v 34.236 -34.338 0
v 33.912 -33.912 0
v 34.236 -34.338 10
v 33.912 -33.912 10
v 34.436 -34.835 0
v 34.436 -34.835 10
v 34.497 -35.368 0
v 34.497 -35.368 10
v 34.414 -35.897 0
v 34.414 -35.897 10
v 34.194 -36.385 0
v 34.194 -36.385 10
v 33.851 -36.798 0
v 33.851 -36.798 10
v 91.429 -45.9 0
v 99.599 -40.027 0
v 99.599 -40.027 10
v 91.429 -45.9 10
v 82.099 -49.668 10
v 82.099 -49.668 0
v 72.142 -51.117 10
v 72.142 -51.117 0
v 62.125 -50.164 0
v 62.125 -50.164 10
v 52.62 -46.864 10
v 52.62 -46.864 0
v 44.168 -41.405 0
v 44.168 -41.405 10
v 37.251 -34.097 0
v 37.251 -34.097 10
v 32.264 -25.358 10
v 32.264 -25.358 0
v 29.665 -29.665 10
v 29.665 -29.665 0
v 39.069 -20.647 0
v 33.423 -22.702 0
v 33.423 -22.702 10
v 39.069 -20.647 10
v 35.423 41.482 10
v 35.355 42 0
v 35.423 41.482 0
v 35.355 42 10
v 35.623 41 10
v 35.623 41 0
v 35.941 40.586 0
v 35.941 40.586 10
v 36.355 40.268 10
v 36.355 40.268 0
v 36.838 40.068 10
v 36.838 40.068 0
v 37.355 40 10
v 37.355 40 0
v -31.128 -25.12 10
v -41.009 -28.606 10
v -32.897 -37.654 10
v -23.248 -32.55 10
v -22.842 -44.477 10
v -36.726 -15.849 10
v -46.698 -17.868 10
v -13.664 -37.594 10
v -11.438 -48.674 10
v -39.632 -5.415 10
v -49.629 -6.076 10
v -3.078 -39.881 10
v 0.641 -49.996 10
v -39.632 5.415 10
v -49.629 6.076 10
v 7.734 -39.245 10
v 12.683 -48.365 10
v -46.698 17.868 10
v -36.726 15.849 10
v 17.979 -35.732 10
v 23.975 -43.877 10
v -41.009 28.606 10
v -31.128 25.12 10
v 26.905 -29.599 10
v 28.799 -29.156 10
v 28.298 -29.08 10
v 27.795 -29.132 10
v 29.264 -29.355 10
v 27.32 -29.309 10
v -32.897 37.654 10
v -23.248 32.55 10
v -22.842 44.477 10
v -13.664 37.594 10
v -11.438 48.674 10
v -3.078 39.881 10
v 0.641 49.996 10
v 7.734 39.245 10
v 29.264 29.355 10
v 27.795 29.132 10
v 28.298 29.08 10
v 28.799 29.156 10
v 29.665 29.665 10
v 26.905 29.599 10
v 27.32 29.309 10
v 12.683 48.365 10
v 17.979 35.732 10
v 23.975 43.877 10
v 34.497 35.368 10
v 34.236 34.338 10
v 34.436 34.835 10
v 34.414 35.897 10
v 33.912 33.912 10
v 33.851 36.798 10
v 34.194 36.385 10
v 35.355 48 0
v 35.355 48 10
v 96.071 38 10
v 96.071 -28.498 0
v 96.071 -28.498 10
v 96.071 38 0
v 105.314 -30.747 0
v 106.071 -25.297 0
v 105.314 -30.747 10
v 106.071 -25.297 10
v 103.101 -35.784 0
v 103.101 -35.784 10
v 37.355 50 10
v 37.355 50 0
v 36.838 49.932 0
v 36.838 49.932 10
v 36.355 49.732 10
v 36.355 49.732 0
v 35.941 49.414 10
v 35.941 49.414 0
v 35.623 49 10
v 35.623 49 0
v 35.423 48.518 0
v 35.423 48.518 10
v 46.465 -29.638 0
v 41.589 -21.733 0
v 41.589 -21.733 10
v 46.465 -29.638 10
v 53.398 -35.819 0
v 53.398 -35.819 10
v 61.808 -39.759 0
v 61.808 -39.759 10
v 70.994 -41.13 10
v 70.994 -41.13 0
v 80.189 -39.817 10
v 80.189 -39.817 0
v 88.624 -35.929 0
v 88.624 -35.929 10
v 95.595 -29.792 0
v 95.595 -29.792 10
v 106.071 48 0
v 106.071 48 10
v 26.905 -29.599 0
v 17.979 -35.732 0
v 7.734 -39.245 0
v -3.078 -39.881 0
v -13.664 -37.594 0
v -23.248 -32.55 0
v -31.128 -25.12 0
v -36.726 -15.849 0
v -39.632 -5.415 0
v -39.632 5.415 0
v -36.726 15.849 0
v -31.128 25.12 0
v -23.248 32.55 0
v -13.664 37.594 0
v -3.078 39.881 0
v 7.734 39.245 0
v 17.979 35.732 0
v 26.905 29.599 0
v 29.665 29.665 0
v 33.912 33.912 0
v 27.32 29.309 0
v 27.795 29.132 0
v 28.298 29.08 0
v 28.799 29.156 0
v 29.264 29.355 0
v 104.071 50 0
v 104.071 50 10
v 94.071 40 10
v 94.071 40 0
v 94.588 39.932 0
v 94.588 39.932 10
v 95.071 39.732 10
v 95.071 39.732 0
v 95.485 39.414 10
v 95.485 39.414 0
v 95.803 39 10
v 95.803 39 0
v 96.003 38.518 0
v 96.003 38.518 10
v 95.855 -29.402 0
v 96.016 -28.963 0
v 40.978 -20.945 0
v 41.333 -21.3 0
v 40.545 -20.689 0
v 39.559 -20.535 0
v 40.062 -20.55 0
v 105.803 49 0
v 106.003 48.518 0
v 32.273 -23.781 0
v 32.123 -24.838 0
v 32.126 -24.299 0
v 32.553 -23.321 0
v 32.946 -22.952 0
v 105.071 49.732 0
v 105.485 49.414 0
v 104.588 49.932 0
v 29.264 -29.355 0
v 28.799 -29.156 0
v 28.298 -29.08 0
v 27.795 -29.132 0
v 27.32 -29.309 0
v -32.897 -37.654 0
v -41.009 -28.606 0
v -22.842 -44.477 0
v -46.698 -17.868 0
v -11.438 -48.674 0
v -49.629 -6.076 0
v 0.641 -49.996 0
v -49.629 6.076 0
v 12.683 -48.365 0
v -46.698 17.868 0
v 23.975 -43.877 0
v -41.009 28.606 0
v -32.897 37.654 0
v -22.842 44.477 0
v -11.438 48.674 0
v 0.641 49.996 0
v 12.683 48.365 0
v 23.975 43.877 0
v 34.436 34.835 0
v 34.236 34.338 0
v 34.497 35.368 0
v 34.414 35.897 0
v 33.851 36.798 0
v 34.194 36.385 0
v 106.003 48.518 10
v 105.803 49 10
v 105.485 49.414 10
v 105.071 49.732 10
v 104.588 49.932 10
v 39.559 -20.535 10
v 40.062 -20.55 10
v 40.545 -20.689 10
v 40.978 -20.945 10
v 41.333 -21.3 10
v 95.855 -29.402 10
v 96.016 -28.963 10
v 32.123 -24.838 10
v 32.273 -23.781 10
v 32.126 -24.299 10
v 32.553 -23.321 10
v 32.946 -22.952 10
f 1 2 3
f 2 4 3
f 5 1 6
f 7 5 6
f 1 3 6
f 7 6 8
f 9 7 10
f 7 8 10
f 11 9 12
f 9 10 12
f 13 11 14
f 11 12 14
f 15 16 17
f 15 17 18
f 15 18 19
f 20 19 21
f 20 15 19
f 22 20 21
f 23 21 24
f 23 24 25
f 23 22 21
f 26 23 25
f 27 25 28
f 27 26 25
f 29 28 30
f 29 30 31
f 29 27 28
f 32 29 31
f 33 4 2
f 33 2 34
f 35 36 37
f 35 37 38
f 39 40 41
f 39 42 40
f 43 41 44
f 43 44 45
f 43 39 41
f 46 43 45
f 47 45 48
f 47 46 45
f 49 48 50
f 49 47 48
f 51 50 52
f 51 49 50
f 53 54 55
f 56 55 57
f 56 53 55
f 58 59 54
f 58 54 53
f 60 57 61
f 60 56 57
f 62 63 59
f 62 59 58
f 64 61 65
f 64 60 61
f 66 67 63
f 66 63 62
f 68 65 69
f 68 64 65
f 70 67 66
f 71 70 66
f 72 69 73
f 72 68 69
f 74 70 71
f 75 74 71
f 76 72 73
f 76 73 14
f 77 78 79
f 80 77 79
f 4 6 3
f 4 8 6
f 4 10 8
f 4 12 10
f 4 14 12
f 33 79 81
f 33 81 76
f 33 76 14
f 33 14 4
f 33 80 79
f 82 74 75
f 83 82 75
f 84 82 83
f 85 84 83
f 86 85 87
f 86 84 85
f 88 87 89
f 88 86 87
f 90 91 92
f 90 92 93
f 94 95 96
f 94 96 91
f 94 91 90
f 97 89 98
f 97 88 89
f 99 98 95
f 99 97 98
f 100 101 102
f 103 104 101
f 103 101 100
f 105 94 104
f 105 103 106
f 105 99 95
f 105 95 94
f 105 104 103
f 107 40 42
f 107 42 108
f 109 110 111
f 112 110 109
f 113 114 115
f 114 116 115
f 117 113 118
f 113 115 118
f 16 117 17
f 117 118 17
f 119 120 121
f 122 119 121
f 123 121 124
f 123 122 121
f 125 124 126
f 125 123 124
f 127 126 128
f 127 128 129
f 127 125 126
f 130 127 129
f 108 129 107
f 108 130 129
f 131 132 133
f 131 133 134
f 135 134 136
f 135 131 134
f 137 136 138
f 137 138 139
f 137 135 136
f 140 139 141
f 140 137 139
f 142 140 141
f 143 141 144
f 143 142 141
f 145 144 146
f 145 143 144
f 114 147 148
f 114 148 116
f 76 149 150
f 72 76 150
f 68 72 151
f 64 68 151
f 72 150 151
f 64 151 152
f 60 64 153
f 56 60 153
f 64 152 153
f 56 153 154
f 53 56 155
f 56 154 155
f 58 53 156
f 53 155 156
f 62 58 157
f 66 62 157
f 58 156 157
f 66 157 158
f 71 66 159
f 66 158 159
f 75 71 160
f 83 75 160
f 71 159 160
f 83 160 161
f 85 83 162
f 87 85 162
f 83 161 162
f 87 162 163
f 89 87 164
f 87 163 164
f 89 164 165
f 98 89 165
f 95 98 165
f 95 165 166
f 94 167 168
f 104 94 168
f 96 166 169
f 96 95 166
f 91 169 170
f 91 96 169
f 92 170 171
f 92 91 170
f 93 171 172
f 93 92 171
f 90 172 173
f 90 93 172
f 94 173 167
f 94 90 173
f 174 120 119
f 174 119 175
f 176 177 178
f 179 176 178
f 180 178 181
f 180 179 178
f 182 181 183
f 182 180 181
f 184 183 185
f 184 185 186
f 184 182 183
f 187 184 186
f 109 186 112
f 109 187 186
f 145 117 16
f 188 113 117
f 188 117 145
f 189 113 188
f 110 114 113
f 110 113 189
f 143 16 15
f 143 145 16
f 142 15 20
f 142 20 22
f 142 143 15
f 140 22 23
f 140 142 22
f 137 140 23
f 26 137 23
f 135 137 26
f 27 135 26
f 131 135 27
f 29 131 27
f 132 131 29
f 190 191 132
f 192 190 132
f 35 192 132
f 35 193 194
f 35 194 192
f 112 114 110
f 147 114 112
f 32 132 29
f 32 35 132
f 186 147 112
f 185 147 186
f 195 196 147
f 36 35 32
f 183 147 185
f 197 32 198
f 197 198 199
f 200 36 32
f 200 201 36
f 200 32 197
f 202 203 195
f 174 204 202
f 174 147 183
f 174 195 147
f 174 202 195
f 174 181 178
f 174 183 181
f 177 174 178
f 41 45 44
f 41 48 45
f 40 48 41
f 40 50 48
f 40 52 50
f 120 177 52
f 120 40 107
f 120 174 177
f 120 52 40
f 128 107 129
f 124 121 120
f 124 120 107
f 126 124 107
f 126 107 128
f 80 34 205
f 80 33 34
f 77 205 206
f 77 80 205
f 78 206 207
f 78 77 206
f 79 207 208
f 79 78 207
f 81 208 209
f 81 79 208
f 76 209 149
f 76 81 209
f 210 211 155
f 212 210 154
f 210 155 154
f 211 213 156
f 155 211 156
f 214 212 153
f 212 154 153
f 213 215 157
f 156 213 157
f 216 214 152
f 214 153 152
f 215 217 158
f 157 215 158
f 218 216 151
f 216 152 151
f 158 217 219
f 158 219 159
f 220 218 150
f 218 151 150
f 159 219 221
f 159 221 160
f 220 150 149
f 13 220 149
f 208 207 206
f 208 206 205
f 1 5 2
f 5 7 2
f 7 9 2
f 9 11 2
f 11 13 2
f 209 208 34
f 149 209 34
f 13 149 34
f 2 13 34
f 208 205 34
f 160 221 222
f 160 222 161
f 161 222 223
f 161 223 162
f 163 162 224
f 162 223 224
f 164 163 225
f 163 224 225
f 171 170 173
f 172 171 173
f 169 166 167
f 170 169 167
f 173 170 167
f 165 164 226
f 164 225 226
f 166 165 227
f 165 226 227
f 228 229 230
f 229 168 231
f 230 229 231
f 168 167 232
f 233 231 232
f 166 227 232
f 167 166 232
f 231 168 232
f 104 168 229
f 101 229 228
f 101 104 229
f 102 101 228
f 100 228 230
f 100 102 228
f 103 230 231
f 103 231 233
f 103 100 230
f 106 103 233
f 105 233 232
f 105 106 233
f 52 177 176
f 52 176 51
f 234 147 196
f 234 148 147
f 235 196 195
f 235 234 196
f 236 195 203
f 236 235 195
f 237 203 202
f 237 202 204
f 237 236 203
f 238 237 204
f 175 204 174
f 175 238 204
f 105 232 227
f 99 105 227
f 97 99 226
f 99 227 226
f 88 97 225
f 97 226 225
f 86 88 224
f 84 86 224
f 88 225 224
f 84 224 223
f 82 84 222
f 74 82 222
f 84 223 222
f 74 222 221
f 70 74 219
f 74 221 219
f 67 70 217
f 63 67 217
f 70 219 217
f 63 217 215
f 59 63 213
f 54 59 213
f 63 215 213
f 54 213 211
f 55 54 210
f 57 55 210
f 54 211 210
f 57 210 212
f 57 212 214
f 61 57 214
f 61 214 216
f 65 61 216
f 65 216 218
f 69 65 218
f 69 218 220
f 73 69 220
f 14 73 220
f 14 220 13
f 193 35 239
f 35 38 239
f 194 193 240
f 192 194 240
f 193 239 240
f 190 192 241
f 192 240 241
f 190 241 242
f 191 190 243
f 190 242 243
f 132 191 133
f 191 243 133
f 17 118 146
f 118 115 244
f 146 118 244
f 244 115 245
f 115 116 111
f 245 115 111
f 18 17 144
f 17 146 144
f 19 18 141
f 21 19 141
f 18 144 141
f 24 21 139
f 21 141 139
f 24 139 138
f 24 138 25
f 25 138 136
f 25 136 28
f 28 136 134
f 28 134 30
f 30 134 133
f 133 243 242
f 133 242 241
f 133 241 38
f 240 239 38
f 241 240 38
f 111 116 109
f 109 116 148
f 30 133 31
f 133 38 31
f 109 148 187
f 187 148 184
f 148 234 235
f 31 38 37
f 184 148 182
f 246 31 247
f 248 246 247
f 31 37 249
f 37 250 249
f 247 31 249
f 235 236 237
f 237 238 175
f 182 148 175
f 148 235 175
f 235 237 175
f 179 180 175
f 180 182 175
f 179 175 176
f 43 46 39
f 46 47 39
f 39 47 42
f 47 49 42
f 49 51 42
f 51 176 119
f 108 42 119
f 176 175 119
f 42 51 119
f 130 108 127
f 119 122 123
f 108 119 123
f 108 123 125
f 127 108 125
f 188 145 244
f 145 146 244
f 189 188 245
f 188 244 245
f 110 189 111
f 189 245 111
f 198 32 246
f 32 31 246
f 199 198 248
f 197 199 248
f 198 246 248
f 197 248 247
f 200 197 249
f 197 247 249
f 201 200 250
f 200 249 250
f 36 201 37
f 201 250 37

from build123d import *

# Parameters (mm, degrees)
SALIENTE_EXTRUIR1_DEPTH   = 10
SALIENTE_EXTRUIR1_2_DEPTH = 10
REDONDEO1_R               = 20
REDONDEO4_R               = 2
REDONDEO5_R               = 2
REDONDEO6_R               = 2


with BuildPart() as part:
    # Croquis1 → Saliente-Extruir1 (new body)
    with BuildSketch(Plane.XY):
        with BuildLine():
            Line((35.355339059, -35.355339059), (28.284271247, -28.284271247))
            ThreePointArc((28.284271247, -28.284271247), (-40, 0), (28.284271247, 28.284271247))
            Line((28.284271247, 28.284271247), (35.355339059, 35.355339059))
            ThreePointArc((35.355339059, 35.355339059), (-50, 0), (35.355339059, -35.355339059))
        make_face()
    extrude(amount=SALIENTE_EXTRUIR1_DEPTH)

    # Redondeo6
    redondeo6_edges = [part.edges().sort_by_distance(p)[0] for p in [
        (28.284271247, -28.284271247, 5),
        (35.355339059, -35.355339059, 5),
        (35.355339059, 35.355339059, 5),
        (28.284271247, 28.284271247, 5),
    ]]
    fillet(redondeo6_edges, radius=REDONDEO6_R)


with BuildPart() as body_2:
    # Croquis1 → Saliente-Extruir1 2 (new body)
    with BuildSketch(Plane.XY):
        with BuildLine():
            Line((35.355339059, 50), (106.070861158, 50))
            Line((106.070861158, 50), (106.070861158, -32.495099916))
            ThreePointArc((106.070861158, -32.495099916), (65.995018822, -50.82037074), (31.496290842, -23.402740327))
            Line((31.496290842, -23.402740327), (40.89321705, -19.982538894))
            ThreePointArc((40.89321705, -19.982538894), (65.788989313, -40.6891053), (96.070861158, -29.218725775))
            Line((96.070861158, -29.218725775), (96.070861158, 40))
            Line((96.070861158, 40), (35.355339059, 40))
            Line((35.355339059, 40), (35.355339059, 50))
        make_face()
    extrude(amount=SALIENTE_EXTRUIR1_2_DEPTH)

    # Redondeo1
    redondeo1_edges = [body_2.edges().sort_by_distance(p)[0] for p in [
        (106.070861158, -32.495099916, 5),
    ]]
    fillet(redondeo1_edges, radius=REDONDEO1_R)

    # Redondeo4
    redondeo4_edges = [body_2.edges().sort_by_distance(p)[0] for p in [
        (106.070861158, 50, 5),
    ]]
    fillet(redondeo4_edges, radius=REDONDEO4_R)

    # Redondeo5
    redondeo5_edges = [body_2.edges().sort_by_distance(p)[0] for p in [
        (31.496290842, -23.402740327, 5),
        (40.89321705, -19.982538894, 5),
        (96.070861158, -29.218725775, 5),
        (96.070861158, 40, 5),
        (35.355339059, 40, 5),
        (35.355339059, 50, 5),
    ]]
    fillet(redondeo5_edges, radius=REDONDEO5_R)


solid = Compound([part.part, body_2.part])
